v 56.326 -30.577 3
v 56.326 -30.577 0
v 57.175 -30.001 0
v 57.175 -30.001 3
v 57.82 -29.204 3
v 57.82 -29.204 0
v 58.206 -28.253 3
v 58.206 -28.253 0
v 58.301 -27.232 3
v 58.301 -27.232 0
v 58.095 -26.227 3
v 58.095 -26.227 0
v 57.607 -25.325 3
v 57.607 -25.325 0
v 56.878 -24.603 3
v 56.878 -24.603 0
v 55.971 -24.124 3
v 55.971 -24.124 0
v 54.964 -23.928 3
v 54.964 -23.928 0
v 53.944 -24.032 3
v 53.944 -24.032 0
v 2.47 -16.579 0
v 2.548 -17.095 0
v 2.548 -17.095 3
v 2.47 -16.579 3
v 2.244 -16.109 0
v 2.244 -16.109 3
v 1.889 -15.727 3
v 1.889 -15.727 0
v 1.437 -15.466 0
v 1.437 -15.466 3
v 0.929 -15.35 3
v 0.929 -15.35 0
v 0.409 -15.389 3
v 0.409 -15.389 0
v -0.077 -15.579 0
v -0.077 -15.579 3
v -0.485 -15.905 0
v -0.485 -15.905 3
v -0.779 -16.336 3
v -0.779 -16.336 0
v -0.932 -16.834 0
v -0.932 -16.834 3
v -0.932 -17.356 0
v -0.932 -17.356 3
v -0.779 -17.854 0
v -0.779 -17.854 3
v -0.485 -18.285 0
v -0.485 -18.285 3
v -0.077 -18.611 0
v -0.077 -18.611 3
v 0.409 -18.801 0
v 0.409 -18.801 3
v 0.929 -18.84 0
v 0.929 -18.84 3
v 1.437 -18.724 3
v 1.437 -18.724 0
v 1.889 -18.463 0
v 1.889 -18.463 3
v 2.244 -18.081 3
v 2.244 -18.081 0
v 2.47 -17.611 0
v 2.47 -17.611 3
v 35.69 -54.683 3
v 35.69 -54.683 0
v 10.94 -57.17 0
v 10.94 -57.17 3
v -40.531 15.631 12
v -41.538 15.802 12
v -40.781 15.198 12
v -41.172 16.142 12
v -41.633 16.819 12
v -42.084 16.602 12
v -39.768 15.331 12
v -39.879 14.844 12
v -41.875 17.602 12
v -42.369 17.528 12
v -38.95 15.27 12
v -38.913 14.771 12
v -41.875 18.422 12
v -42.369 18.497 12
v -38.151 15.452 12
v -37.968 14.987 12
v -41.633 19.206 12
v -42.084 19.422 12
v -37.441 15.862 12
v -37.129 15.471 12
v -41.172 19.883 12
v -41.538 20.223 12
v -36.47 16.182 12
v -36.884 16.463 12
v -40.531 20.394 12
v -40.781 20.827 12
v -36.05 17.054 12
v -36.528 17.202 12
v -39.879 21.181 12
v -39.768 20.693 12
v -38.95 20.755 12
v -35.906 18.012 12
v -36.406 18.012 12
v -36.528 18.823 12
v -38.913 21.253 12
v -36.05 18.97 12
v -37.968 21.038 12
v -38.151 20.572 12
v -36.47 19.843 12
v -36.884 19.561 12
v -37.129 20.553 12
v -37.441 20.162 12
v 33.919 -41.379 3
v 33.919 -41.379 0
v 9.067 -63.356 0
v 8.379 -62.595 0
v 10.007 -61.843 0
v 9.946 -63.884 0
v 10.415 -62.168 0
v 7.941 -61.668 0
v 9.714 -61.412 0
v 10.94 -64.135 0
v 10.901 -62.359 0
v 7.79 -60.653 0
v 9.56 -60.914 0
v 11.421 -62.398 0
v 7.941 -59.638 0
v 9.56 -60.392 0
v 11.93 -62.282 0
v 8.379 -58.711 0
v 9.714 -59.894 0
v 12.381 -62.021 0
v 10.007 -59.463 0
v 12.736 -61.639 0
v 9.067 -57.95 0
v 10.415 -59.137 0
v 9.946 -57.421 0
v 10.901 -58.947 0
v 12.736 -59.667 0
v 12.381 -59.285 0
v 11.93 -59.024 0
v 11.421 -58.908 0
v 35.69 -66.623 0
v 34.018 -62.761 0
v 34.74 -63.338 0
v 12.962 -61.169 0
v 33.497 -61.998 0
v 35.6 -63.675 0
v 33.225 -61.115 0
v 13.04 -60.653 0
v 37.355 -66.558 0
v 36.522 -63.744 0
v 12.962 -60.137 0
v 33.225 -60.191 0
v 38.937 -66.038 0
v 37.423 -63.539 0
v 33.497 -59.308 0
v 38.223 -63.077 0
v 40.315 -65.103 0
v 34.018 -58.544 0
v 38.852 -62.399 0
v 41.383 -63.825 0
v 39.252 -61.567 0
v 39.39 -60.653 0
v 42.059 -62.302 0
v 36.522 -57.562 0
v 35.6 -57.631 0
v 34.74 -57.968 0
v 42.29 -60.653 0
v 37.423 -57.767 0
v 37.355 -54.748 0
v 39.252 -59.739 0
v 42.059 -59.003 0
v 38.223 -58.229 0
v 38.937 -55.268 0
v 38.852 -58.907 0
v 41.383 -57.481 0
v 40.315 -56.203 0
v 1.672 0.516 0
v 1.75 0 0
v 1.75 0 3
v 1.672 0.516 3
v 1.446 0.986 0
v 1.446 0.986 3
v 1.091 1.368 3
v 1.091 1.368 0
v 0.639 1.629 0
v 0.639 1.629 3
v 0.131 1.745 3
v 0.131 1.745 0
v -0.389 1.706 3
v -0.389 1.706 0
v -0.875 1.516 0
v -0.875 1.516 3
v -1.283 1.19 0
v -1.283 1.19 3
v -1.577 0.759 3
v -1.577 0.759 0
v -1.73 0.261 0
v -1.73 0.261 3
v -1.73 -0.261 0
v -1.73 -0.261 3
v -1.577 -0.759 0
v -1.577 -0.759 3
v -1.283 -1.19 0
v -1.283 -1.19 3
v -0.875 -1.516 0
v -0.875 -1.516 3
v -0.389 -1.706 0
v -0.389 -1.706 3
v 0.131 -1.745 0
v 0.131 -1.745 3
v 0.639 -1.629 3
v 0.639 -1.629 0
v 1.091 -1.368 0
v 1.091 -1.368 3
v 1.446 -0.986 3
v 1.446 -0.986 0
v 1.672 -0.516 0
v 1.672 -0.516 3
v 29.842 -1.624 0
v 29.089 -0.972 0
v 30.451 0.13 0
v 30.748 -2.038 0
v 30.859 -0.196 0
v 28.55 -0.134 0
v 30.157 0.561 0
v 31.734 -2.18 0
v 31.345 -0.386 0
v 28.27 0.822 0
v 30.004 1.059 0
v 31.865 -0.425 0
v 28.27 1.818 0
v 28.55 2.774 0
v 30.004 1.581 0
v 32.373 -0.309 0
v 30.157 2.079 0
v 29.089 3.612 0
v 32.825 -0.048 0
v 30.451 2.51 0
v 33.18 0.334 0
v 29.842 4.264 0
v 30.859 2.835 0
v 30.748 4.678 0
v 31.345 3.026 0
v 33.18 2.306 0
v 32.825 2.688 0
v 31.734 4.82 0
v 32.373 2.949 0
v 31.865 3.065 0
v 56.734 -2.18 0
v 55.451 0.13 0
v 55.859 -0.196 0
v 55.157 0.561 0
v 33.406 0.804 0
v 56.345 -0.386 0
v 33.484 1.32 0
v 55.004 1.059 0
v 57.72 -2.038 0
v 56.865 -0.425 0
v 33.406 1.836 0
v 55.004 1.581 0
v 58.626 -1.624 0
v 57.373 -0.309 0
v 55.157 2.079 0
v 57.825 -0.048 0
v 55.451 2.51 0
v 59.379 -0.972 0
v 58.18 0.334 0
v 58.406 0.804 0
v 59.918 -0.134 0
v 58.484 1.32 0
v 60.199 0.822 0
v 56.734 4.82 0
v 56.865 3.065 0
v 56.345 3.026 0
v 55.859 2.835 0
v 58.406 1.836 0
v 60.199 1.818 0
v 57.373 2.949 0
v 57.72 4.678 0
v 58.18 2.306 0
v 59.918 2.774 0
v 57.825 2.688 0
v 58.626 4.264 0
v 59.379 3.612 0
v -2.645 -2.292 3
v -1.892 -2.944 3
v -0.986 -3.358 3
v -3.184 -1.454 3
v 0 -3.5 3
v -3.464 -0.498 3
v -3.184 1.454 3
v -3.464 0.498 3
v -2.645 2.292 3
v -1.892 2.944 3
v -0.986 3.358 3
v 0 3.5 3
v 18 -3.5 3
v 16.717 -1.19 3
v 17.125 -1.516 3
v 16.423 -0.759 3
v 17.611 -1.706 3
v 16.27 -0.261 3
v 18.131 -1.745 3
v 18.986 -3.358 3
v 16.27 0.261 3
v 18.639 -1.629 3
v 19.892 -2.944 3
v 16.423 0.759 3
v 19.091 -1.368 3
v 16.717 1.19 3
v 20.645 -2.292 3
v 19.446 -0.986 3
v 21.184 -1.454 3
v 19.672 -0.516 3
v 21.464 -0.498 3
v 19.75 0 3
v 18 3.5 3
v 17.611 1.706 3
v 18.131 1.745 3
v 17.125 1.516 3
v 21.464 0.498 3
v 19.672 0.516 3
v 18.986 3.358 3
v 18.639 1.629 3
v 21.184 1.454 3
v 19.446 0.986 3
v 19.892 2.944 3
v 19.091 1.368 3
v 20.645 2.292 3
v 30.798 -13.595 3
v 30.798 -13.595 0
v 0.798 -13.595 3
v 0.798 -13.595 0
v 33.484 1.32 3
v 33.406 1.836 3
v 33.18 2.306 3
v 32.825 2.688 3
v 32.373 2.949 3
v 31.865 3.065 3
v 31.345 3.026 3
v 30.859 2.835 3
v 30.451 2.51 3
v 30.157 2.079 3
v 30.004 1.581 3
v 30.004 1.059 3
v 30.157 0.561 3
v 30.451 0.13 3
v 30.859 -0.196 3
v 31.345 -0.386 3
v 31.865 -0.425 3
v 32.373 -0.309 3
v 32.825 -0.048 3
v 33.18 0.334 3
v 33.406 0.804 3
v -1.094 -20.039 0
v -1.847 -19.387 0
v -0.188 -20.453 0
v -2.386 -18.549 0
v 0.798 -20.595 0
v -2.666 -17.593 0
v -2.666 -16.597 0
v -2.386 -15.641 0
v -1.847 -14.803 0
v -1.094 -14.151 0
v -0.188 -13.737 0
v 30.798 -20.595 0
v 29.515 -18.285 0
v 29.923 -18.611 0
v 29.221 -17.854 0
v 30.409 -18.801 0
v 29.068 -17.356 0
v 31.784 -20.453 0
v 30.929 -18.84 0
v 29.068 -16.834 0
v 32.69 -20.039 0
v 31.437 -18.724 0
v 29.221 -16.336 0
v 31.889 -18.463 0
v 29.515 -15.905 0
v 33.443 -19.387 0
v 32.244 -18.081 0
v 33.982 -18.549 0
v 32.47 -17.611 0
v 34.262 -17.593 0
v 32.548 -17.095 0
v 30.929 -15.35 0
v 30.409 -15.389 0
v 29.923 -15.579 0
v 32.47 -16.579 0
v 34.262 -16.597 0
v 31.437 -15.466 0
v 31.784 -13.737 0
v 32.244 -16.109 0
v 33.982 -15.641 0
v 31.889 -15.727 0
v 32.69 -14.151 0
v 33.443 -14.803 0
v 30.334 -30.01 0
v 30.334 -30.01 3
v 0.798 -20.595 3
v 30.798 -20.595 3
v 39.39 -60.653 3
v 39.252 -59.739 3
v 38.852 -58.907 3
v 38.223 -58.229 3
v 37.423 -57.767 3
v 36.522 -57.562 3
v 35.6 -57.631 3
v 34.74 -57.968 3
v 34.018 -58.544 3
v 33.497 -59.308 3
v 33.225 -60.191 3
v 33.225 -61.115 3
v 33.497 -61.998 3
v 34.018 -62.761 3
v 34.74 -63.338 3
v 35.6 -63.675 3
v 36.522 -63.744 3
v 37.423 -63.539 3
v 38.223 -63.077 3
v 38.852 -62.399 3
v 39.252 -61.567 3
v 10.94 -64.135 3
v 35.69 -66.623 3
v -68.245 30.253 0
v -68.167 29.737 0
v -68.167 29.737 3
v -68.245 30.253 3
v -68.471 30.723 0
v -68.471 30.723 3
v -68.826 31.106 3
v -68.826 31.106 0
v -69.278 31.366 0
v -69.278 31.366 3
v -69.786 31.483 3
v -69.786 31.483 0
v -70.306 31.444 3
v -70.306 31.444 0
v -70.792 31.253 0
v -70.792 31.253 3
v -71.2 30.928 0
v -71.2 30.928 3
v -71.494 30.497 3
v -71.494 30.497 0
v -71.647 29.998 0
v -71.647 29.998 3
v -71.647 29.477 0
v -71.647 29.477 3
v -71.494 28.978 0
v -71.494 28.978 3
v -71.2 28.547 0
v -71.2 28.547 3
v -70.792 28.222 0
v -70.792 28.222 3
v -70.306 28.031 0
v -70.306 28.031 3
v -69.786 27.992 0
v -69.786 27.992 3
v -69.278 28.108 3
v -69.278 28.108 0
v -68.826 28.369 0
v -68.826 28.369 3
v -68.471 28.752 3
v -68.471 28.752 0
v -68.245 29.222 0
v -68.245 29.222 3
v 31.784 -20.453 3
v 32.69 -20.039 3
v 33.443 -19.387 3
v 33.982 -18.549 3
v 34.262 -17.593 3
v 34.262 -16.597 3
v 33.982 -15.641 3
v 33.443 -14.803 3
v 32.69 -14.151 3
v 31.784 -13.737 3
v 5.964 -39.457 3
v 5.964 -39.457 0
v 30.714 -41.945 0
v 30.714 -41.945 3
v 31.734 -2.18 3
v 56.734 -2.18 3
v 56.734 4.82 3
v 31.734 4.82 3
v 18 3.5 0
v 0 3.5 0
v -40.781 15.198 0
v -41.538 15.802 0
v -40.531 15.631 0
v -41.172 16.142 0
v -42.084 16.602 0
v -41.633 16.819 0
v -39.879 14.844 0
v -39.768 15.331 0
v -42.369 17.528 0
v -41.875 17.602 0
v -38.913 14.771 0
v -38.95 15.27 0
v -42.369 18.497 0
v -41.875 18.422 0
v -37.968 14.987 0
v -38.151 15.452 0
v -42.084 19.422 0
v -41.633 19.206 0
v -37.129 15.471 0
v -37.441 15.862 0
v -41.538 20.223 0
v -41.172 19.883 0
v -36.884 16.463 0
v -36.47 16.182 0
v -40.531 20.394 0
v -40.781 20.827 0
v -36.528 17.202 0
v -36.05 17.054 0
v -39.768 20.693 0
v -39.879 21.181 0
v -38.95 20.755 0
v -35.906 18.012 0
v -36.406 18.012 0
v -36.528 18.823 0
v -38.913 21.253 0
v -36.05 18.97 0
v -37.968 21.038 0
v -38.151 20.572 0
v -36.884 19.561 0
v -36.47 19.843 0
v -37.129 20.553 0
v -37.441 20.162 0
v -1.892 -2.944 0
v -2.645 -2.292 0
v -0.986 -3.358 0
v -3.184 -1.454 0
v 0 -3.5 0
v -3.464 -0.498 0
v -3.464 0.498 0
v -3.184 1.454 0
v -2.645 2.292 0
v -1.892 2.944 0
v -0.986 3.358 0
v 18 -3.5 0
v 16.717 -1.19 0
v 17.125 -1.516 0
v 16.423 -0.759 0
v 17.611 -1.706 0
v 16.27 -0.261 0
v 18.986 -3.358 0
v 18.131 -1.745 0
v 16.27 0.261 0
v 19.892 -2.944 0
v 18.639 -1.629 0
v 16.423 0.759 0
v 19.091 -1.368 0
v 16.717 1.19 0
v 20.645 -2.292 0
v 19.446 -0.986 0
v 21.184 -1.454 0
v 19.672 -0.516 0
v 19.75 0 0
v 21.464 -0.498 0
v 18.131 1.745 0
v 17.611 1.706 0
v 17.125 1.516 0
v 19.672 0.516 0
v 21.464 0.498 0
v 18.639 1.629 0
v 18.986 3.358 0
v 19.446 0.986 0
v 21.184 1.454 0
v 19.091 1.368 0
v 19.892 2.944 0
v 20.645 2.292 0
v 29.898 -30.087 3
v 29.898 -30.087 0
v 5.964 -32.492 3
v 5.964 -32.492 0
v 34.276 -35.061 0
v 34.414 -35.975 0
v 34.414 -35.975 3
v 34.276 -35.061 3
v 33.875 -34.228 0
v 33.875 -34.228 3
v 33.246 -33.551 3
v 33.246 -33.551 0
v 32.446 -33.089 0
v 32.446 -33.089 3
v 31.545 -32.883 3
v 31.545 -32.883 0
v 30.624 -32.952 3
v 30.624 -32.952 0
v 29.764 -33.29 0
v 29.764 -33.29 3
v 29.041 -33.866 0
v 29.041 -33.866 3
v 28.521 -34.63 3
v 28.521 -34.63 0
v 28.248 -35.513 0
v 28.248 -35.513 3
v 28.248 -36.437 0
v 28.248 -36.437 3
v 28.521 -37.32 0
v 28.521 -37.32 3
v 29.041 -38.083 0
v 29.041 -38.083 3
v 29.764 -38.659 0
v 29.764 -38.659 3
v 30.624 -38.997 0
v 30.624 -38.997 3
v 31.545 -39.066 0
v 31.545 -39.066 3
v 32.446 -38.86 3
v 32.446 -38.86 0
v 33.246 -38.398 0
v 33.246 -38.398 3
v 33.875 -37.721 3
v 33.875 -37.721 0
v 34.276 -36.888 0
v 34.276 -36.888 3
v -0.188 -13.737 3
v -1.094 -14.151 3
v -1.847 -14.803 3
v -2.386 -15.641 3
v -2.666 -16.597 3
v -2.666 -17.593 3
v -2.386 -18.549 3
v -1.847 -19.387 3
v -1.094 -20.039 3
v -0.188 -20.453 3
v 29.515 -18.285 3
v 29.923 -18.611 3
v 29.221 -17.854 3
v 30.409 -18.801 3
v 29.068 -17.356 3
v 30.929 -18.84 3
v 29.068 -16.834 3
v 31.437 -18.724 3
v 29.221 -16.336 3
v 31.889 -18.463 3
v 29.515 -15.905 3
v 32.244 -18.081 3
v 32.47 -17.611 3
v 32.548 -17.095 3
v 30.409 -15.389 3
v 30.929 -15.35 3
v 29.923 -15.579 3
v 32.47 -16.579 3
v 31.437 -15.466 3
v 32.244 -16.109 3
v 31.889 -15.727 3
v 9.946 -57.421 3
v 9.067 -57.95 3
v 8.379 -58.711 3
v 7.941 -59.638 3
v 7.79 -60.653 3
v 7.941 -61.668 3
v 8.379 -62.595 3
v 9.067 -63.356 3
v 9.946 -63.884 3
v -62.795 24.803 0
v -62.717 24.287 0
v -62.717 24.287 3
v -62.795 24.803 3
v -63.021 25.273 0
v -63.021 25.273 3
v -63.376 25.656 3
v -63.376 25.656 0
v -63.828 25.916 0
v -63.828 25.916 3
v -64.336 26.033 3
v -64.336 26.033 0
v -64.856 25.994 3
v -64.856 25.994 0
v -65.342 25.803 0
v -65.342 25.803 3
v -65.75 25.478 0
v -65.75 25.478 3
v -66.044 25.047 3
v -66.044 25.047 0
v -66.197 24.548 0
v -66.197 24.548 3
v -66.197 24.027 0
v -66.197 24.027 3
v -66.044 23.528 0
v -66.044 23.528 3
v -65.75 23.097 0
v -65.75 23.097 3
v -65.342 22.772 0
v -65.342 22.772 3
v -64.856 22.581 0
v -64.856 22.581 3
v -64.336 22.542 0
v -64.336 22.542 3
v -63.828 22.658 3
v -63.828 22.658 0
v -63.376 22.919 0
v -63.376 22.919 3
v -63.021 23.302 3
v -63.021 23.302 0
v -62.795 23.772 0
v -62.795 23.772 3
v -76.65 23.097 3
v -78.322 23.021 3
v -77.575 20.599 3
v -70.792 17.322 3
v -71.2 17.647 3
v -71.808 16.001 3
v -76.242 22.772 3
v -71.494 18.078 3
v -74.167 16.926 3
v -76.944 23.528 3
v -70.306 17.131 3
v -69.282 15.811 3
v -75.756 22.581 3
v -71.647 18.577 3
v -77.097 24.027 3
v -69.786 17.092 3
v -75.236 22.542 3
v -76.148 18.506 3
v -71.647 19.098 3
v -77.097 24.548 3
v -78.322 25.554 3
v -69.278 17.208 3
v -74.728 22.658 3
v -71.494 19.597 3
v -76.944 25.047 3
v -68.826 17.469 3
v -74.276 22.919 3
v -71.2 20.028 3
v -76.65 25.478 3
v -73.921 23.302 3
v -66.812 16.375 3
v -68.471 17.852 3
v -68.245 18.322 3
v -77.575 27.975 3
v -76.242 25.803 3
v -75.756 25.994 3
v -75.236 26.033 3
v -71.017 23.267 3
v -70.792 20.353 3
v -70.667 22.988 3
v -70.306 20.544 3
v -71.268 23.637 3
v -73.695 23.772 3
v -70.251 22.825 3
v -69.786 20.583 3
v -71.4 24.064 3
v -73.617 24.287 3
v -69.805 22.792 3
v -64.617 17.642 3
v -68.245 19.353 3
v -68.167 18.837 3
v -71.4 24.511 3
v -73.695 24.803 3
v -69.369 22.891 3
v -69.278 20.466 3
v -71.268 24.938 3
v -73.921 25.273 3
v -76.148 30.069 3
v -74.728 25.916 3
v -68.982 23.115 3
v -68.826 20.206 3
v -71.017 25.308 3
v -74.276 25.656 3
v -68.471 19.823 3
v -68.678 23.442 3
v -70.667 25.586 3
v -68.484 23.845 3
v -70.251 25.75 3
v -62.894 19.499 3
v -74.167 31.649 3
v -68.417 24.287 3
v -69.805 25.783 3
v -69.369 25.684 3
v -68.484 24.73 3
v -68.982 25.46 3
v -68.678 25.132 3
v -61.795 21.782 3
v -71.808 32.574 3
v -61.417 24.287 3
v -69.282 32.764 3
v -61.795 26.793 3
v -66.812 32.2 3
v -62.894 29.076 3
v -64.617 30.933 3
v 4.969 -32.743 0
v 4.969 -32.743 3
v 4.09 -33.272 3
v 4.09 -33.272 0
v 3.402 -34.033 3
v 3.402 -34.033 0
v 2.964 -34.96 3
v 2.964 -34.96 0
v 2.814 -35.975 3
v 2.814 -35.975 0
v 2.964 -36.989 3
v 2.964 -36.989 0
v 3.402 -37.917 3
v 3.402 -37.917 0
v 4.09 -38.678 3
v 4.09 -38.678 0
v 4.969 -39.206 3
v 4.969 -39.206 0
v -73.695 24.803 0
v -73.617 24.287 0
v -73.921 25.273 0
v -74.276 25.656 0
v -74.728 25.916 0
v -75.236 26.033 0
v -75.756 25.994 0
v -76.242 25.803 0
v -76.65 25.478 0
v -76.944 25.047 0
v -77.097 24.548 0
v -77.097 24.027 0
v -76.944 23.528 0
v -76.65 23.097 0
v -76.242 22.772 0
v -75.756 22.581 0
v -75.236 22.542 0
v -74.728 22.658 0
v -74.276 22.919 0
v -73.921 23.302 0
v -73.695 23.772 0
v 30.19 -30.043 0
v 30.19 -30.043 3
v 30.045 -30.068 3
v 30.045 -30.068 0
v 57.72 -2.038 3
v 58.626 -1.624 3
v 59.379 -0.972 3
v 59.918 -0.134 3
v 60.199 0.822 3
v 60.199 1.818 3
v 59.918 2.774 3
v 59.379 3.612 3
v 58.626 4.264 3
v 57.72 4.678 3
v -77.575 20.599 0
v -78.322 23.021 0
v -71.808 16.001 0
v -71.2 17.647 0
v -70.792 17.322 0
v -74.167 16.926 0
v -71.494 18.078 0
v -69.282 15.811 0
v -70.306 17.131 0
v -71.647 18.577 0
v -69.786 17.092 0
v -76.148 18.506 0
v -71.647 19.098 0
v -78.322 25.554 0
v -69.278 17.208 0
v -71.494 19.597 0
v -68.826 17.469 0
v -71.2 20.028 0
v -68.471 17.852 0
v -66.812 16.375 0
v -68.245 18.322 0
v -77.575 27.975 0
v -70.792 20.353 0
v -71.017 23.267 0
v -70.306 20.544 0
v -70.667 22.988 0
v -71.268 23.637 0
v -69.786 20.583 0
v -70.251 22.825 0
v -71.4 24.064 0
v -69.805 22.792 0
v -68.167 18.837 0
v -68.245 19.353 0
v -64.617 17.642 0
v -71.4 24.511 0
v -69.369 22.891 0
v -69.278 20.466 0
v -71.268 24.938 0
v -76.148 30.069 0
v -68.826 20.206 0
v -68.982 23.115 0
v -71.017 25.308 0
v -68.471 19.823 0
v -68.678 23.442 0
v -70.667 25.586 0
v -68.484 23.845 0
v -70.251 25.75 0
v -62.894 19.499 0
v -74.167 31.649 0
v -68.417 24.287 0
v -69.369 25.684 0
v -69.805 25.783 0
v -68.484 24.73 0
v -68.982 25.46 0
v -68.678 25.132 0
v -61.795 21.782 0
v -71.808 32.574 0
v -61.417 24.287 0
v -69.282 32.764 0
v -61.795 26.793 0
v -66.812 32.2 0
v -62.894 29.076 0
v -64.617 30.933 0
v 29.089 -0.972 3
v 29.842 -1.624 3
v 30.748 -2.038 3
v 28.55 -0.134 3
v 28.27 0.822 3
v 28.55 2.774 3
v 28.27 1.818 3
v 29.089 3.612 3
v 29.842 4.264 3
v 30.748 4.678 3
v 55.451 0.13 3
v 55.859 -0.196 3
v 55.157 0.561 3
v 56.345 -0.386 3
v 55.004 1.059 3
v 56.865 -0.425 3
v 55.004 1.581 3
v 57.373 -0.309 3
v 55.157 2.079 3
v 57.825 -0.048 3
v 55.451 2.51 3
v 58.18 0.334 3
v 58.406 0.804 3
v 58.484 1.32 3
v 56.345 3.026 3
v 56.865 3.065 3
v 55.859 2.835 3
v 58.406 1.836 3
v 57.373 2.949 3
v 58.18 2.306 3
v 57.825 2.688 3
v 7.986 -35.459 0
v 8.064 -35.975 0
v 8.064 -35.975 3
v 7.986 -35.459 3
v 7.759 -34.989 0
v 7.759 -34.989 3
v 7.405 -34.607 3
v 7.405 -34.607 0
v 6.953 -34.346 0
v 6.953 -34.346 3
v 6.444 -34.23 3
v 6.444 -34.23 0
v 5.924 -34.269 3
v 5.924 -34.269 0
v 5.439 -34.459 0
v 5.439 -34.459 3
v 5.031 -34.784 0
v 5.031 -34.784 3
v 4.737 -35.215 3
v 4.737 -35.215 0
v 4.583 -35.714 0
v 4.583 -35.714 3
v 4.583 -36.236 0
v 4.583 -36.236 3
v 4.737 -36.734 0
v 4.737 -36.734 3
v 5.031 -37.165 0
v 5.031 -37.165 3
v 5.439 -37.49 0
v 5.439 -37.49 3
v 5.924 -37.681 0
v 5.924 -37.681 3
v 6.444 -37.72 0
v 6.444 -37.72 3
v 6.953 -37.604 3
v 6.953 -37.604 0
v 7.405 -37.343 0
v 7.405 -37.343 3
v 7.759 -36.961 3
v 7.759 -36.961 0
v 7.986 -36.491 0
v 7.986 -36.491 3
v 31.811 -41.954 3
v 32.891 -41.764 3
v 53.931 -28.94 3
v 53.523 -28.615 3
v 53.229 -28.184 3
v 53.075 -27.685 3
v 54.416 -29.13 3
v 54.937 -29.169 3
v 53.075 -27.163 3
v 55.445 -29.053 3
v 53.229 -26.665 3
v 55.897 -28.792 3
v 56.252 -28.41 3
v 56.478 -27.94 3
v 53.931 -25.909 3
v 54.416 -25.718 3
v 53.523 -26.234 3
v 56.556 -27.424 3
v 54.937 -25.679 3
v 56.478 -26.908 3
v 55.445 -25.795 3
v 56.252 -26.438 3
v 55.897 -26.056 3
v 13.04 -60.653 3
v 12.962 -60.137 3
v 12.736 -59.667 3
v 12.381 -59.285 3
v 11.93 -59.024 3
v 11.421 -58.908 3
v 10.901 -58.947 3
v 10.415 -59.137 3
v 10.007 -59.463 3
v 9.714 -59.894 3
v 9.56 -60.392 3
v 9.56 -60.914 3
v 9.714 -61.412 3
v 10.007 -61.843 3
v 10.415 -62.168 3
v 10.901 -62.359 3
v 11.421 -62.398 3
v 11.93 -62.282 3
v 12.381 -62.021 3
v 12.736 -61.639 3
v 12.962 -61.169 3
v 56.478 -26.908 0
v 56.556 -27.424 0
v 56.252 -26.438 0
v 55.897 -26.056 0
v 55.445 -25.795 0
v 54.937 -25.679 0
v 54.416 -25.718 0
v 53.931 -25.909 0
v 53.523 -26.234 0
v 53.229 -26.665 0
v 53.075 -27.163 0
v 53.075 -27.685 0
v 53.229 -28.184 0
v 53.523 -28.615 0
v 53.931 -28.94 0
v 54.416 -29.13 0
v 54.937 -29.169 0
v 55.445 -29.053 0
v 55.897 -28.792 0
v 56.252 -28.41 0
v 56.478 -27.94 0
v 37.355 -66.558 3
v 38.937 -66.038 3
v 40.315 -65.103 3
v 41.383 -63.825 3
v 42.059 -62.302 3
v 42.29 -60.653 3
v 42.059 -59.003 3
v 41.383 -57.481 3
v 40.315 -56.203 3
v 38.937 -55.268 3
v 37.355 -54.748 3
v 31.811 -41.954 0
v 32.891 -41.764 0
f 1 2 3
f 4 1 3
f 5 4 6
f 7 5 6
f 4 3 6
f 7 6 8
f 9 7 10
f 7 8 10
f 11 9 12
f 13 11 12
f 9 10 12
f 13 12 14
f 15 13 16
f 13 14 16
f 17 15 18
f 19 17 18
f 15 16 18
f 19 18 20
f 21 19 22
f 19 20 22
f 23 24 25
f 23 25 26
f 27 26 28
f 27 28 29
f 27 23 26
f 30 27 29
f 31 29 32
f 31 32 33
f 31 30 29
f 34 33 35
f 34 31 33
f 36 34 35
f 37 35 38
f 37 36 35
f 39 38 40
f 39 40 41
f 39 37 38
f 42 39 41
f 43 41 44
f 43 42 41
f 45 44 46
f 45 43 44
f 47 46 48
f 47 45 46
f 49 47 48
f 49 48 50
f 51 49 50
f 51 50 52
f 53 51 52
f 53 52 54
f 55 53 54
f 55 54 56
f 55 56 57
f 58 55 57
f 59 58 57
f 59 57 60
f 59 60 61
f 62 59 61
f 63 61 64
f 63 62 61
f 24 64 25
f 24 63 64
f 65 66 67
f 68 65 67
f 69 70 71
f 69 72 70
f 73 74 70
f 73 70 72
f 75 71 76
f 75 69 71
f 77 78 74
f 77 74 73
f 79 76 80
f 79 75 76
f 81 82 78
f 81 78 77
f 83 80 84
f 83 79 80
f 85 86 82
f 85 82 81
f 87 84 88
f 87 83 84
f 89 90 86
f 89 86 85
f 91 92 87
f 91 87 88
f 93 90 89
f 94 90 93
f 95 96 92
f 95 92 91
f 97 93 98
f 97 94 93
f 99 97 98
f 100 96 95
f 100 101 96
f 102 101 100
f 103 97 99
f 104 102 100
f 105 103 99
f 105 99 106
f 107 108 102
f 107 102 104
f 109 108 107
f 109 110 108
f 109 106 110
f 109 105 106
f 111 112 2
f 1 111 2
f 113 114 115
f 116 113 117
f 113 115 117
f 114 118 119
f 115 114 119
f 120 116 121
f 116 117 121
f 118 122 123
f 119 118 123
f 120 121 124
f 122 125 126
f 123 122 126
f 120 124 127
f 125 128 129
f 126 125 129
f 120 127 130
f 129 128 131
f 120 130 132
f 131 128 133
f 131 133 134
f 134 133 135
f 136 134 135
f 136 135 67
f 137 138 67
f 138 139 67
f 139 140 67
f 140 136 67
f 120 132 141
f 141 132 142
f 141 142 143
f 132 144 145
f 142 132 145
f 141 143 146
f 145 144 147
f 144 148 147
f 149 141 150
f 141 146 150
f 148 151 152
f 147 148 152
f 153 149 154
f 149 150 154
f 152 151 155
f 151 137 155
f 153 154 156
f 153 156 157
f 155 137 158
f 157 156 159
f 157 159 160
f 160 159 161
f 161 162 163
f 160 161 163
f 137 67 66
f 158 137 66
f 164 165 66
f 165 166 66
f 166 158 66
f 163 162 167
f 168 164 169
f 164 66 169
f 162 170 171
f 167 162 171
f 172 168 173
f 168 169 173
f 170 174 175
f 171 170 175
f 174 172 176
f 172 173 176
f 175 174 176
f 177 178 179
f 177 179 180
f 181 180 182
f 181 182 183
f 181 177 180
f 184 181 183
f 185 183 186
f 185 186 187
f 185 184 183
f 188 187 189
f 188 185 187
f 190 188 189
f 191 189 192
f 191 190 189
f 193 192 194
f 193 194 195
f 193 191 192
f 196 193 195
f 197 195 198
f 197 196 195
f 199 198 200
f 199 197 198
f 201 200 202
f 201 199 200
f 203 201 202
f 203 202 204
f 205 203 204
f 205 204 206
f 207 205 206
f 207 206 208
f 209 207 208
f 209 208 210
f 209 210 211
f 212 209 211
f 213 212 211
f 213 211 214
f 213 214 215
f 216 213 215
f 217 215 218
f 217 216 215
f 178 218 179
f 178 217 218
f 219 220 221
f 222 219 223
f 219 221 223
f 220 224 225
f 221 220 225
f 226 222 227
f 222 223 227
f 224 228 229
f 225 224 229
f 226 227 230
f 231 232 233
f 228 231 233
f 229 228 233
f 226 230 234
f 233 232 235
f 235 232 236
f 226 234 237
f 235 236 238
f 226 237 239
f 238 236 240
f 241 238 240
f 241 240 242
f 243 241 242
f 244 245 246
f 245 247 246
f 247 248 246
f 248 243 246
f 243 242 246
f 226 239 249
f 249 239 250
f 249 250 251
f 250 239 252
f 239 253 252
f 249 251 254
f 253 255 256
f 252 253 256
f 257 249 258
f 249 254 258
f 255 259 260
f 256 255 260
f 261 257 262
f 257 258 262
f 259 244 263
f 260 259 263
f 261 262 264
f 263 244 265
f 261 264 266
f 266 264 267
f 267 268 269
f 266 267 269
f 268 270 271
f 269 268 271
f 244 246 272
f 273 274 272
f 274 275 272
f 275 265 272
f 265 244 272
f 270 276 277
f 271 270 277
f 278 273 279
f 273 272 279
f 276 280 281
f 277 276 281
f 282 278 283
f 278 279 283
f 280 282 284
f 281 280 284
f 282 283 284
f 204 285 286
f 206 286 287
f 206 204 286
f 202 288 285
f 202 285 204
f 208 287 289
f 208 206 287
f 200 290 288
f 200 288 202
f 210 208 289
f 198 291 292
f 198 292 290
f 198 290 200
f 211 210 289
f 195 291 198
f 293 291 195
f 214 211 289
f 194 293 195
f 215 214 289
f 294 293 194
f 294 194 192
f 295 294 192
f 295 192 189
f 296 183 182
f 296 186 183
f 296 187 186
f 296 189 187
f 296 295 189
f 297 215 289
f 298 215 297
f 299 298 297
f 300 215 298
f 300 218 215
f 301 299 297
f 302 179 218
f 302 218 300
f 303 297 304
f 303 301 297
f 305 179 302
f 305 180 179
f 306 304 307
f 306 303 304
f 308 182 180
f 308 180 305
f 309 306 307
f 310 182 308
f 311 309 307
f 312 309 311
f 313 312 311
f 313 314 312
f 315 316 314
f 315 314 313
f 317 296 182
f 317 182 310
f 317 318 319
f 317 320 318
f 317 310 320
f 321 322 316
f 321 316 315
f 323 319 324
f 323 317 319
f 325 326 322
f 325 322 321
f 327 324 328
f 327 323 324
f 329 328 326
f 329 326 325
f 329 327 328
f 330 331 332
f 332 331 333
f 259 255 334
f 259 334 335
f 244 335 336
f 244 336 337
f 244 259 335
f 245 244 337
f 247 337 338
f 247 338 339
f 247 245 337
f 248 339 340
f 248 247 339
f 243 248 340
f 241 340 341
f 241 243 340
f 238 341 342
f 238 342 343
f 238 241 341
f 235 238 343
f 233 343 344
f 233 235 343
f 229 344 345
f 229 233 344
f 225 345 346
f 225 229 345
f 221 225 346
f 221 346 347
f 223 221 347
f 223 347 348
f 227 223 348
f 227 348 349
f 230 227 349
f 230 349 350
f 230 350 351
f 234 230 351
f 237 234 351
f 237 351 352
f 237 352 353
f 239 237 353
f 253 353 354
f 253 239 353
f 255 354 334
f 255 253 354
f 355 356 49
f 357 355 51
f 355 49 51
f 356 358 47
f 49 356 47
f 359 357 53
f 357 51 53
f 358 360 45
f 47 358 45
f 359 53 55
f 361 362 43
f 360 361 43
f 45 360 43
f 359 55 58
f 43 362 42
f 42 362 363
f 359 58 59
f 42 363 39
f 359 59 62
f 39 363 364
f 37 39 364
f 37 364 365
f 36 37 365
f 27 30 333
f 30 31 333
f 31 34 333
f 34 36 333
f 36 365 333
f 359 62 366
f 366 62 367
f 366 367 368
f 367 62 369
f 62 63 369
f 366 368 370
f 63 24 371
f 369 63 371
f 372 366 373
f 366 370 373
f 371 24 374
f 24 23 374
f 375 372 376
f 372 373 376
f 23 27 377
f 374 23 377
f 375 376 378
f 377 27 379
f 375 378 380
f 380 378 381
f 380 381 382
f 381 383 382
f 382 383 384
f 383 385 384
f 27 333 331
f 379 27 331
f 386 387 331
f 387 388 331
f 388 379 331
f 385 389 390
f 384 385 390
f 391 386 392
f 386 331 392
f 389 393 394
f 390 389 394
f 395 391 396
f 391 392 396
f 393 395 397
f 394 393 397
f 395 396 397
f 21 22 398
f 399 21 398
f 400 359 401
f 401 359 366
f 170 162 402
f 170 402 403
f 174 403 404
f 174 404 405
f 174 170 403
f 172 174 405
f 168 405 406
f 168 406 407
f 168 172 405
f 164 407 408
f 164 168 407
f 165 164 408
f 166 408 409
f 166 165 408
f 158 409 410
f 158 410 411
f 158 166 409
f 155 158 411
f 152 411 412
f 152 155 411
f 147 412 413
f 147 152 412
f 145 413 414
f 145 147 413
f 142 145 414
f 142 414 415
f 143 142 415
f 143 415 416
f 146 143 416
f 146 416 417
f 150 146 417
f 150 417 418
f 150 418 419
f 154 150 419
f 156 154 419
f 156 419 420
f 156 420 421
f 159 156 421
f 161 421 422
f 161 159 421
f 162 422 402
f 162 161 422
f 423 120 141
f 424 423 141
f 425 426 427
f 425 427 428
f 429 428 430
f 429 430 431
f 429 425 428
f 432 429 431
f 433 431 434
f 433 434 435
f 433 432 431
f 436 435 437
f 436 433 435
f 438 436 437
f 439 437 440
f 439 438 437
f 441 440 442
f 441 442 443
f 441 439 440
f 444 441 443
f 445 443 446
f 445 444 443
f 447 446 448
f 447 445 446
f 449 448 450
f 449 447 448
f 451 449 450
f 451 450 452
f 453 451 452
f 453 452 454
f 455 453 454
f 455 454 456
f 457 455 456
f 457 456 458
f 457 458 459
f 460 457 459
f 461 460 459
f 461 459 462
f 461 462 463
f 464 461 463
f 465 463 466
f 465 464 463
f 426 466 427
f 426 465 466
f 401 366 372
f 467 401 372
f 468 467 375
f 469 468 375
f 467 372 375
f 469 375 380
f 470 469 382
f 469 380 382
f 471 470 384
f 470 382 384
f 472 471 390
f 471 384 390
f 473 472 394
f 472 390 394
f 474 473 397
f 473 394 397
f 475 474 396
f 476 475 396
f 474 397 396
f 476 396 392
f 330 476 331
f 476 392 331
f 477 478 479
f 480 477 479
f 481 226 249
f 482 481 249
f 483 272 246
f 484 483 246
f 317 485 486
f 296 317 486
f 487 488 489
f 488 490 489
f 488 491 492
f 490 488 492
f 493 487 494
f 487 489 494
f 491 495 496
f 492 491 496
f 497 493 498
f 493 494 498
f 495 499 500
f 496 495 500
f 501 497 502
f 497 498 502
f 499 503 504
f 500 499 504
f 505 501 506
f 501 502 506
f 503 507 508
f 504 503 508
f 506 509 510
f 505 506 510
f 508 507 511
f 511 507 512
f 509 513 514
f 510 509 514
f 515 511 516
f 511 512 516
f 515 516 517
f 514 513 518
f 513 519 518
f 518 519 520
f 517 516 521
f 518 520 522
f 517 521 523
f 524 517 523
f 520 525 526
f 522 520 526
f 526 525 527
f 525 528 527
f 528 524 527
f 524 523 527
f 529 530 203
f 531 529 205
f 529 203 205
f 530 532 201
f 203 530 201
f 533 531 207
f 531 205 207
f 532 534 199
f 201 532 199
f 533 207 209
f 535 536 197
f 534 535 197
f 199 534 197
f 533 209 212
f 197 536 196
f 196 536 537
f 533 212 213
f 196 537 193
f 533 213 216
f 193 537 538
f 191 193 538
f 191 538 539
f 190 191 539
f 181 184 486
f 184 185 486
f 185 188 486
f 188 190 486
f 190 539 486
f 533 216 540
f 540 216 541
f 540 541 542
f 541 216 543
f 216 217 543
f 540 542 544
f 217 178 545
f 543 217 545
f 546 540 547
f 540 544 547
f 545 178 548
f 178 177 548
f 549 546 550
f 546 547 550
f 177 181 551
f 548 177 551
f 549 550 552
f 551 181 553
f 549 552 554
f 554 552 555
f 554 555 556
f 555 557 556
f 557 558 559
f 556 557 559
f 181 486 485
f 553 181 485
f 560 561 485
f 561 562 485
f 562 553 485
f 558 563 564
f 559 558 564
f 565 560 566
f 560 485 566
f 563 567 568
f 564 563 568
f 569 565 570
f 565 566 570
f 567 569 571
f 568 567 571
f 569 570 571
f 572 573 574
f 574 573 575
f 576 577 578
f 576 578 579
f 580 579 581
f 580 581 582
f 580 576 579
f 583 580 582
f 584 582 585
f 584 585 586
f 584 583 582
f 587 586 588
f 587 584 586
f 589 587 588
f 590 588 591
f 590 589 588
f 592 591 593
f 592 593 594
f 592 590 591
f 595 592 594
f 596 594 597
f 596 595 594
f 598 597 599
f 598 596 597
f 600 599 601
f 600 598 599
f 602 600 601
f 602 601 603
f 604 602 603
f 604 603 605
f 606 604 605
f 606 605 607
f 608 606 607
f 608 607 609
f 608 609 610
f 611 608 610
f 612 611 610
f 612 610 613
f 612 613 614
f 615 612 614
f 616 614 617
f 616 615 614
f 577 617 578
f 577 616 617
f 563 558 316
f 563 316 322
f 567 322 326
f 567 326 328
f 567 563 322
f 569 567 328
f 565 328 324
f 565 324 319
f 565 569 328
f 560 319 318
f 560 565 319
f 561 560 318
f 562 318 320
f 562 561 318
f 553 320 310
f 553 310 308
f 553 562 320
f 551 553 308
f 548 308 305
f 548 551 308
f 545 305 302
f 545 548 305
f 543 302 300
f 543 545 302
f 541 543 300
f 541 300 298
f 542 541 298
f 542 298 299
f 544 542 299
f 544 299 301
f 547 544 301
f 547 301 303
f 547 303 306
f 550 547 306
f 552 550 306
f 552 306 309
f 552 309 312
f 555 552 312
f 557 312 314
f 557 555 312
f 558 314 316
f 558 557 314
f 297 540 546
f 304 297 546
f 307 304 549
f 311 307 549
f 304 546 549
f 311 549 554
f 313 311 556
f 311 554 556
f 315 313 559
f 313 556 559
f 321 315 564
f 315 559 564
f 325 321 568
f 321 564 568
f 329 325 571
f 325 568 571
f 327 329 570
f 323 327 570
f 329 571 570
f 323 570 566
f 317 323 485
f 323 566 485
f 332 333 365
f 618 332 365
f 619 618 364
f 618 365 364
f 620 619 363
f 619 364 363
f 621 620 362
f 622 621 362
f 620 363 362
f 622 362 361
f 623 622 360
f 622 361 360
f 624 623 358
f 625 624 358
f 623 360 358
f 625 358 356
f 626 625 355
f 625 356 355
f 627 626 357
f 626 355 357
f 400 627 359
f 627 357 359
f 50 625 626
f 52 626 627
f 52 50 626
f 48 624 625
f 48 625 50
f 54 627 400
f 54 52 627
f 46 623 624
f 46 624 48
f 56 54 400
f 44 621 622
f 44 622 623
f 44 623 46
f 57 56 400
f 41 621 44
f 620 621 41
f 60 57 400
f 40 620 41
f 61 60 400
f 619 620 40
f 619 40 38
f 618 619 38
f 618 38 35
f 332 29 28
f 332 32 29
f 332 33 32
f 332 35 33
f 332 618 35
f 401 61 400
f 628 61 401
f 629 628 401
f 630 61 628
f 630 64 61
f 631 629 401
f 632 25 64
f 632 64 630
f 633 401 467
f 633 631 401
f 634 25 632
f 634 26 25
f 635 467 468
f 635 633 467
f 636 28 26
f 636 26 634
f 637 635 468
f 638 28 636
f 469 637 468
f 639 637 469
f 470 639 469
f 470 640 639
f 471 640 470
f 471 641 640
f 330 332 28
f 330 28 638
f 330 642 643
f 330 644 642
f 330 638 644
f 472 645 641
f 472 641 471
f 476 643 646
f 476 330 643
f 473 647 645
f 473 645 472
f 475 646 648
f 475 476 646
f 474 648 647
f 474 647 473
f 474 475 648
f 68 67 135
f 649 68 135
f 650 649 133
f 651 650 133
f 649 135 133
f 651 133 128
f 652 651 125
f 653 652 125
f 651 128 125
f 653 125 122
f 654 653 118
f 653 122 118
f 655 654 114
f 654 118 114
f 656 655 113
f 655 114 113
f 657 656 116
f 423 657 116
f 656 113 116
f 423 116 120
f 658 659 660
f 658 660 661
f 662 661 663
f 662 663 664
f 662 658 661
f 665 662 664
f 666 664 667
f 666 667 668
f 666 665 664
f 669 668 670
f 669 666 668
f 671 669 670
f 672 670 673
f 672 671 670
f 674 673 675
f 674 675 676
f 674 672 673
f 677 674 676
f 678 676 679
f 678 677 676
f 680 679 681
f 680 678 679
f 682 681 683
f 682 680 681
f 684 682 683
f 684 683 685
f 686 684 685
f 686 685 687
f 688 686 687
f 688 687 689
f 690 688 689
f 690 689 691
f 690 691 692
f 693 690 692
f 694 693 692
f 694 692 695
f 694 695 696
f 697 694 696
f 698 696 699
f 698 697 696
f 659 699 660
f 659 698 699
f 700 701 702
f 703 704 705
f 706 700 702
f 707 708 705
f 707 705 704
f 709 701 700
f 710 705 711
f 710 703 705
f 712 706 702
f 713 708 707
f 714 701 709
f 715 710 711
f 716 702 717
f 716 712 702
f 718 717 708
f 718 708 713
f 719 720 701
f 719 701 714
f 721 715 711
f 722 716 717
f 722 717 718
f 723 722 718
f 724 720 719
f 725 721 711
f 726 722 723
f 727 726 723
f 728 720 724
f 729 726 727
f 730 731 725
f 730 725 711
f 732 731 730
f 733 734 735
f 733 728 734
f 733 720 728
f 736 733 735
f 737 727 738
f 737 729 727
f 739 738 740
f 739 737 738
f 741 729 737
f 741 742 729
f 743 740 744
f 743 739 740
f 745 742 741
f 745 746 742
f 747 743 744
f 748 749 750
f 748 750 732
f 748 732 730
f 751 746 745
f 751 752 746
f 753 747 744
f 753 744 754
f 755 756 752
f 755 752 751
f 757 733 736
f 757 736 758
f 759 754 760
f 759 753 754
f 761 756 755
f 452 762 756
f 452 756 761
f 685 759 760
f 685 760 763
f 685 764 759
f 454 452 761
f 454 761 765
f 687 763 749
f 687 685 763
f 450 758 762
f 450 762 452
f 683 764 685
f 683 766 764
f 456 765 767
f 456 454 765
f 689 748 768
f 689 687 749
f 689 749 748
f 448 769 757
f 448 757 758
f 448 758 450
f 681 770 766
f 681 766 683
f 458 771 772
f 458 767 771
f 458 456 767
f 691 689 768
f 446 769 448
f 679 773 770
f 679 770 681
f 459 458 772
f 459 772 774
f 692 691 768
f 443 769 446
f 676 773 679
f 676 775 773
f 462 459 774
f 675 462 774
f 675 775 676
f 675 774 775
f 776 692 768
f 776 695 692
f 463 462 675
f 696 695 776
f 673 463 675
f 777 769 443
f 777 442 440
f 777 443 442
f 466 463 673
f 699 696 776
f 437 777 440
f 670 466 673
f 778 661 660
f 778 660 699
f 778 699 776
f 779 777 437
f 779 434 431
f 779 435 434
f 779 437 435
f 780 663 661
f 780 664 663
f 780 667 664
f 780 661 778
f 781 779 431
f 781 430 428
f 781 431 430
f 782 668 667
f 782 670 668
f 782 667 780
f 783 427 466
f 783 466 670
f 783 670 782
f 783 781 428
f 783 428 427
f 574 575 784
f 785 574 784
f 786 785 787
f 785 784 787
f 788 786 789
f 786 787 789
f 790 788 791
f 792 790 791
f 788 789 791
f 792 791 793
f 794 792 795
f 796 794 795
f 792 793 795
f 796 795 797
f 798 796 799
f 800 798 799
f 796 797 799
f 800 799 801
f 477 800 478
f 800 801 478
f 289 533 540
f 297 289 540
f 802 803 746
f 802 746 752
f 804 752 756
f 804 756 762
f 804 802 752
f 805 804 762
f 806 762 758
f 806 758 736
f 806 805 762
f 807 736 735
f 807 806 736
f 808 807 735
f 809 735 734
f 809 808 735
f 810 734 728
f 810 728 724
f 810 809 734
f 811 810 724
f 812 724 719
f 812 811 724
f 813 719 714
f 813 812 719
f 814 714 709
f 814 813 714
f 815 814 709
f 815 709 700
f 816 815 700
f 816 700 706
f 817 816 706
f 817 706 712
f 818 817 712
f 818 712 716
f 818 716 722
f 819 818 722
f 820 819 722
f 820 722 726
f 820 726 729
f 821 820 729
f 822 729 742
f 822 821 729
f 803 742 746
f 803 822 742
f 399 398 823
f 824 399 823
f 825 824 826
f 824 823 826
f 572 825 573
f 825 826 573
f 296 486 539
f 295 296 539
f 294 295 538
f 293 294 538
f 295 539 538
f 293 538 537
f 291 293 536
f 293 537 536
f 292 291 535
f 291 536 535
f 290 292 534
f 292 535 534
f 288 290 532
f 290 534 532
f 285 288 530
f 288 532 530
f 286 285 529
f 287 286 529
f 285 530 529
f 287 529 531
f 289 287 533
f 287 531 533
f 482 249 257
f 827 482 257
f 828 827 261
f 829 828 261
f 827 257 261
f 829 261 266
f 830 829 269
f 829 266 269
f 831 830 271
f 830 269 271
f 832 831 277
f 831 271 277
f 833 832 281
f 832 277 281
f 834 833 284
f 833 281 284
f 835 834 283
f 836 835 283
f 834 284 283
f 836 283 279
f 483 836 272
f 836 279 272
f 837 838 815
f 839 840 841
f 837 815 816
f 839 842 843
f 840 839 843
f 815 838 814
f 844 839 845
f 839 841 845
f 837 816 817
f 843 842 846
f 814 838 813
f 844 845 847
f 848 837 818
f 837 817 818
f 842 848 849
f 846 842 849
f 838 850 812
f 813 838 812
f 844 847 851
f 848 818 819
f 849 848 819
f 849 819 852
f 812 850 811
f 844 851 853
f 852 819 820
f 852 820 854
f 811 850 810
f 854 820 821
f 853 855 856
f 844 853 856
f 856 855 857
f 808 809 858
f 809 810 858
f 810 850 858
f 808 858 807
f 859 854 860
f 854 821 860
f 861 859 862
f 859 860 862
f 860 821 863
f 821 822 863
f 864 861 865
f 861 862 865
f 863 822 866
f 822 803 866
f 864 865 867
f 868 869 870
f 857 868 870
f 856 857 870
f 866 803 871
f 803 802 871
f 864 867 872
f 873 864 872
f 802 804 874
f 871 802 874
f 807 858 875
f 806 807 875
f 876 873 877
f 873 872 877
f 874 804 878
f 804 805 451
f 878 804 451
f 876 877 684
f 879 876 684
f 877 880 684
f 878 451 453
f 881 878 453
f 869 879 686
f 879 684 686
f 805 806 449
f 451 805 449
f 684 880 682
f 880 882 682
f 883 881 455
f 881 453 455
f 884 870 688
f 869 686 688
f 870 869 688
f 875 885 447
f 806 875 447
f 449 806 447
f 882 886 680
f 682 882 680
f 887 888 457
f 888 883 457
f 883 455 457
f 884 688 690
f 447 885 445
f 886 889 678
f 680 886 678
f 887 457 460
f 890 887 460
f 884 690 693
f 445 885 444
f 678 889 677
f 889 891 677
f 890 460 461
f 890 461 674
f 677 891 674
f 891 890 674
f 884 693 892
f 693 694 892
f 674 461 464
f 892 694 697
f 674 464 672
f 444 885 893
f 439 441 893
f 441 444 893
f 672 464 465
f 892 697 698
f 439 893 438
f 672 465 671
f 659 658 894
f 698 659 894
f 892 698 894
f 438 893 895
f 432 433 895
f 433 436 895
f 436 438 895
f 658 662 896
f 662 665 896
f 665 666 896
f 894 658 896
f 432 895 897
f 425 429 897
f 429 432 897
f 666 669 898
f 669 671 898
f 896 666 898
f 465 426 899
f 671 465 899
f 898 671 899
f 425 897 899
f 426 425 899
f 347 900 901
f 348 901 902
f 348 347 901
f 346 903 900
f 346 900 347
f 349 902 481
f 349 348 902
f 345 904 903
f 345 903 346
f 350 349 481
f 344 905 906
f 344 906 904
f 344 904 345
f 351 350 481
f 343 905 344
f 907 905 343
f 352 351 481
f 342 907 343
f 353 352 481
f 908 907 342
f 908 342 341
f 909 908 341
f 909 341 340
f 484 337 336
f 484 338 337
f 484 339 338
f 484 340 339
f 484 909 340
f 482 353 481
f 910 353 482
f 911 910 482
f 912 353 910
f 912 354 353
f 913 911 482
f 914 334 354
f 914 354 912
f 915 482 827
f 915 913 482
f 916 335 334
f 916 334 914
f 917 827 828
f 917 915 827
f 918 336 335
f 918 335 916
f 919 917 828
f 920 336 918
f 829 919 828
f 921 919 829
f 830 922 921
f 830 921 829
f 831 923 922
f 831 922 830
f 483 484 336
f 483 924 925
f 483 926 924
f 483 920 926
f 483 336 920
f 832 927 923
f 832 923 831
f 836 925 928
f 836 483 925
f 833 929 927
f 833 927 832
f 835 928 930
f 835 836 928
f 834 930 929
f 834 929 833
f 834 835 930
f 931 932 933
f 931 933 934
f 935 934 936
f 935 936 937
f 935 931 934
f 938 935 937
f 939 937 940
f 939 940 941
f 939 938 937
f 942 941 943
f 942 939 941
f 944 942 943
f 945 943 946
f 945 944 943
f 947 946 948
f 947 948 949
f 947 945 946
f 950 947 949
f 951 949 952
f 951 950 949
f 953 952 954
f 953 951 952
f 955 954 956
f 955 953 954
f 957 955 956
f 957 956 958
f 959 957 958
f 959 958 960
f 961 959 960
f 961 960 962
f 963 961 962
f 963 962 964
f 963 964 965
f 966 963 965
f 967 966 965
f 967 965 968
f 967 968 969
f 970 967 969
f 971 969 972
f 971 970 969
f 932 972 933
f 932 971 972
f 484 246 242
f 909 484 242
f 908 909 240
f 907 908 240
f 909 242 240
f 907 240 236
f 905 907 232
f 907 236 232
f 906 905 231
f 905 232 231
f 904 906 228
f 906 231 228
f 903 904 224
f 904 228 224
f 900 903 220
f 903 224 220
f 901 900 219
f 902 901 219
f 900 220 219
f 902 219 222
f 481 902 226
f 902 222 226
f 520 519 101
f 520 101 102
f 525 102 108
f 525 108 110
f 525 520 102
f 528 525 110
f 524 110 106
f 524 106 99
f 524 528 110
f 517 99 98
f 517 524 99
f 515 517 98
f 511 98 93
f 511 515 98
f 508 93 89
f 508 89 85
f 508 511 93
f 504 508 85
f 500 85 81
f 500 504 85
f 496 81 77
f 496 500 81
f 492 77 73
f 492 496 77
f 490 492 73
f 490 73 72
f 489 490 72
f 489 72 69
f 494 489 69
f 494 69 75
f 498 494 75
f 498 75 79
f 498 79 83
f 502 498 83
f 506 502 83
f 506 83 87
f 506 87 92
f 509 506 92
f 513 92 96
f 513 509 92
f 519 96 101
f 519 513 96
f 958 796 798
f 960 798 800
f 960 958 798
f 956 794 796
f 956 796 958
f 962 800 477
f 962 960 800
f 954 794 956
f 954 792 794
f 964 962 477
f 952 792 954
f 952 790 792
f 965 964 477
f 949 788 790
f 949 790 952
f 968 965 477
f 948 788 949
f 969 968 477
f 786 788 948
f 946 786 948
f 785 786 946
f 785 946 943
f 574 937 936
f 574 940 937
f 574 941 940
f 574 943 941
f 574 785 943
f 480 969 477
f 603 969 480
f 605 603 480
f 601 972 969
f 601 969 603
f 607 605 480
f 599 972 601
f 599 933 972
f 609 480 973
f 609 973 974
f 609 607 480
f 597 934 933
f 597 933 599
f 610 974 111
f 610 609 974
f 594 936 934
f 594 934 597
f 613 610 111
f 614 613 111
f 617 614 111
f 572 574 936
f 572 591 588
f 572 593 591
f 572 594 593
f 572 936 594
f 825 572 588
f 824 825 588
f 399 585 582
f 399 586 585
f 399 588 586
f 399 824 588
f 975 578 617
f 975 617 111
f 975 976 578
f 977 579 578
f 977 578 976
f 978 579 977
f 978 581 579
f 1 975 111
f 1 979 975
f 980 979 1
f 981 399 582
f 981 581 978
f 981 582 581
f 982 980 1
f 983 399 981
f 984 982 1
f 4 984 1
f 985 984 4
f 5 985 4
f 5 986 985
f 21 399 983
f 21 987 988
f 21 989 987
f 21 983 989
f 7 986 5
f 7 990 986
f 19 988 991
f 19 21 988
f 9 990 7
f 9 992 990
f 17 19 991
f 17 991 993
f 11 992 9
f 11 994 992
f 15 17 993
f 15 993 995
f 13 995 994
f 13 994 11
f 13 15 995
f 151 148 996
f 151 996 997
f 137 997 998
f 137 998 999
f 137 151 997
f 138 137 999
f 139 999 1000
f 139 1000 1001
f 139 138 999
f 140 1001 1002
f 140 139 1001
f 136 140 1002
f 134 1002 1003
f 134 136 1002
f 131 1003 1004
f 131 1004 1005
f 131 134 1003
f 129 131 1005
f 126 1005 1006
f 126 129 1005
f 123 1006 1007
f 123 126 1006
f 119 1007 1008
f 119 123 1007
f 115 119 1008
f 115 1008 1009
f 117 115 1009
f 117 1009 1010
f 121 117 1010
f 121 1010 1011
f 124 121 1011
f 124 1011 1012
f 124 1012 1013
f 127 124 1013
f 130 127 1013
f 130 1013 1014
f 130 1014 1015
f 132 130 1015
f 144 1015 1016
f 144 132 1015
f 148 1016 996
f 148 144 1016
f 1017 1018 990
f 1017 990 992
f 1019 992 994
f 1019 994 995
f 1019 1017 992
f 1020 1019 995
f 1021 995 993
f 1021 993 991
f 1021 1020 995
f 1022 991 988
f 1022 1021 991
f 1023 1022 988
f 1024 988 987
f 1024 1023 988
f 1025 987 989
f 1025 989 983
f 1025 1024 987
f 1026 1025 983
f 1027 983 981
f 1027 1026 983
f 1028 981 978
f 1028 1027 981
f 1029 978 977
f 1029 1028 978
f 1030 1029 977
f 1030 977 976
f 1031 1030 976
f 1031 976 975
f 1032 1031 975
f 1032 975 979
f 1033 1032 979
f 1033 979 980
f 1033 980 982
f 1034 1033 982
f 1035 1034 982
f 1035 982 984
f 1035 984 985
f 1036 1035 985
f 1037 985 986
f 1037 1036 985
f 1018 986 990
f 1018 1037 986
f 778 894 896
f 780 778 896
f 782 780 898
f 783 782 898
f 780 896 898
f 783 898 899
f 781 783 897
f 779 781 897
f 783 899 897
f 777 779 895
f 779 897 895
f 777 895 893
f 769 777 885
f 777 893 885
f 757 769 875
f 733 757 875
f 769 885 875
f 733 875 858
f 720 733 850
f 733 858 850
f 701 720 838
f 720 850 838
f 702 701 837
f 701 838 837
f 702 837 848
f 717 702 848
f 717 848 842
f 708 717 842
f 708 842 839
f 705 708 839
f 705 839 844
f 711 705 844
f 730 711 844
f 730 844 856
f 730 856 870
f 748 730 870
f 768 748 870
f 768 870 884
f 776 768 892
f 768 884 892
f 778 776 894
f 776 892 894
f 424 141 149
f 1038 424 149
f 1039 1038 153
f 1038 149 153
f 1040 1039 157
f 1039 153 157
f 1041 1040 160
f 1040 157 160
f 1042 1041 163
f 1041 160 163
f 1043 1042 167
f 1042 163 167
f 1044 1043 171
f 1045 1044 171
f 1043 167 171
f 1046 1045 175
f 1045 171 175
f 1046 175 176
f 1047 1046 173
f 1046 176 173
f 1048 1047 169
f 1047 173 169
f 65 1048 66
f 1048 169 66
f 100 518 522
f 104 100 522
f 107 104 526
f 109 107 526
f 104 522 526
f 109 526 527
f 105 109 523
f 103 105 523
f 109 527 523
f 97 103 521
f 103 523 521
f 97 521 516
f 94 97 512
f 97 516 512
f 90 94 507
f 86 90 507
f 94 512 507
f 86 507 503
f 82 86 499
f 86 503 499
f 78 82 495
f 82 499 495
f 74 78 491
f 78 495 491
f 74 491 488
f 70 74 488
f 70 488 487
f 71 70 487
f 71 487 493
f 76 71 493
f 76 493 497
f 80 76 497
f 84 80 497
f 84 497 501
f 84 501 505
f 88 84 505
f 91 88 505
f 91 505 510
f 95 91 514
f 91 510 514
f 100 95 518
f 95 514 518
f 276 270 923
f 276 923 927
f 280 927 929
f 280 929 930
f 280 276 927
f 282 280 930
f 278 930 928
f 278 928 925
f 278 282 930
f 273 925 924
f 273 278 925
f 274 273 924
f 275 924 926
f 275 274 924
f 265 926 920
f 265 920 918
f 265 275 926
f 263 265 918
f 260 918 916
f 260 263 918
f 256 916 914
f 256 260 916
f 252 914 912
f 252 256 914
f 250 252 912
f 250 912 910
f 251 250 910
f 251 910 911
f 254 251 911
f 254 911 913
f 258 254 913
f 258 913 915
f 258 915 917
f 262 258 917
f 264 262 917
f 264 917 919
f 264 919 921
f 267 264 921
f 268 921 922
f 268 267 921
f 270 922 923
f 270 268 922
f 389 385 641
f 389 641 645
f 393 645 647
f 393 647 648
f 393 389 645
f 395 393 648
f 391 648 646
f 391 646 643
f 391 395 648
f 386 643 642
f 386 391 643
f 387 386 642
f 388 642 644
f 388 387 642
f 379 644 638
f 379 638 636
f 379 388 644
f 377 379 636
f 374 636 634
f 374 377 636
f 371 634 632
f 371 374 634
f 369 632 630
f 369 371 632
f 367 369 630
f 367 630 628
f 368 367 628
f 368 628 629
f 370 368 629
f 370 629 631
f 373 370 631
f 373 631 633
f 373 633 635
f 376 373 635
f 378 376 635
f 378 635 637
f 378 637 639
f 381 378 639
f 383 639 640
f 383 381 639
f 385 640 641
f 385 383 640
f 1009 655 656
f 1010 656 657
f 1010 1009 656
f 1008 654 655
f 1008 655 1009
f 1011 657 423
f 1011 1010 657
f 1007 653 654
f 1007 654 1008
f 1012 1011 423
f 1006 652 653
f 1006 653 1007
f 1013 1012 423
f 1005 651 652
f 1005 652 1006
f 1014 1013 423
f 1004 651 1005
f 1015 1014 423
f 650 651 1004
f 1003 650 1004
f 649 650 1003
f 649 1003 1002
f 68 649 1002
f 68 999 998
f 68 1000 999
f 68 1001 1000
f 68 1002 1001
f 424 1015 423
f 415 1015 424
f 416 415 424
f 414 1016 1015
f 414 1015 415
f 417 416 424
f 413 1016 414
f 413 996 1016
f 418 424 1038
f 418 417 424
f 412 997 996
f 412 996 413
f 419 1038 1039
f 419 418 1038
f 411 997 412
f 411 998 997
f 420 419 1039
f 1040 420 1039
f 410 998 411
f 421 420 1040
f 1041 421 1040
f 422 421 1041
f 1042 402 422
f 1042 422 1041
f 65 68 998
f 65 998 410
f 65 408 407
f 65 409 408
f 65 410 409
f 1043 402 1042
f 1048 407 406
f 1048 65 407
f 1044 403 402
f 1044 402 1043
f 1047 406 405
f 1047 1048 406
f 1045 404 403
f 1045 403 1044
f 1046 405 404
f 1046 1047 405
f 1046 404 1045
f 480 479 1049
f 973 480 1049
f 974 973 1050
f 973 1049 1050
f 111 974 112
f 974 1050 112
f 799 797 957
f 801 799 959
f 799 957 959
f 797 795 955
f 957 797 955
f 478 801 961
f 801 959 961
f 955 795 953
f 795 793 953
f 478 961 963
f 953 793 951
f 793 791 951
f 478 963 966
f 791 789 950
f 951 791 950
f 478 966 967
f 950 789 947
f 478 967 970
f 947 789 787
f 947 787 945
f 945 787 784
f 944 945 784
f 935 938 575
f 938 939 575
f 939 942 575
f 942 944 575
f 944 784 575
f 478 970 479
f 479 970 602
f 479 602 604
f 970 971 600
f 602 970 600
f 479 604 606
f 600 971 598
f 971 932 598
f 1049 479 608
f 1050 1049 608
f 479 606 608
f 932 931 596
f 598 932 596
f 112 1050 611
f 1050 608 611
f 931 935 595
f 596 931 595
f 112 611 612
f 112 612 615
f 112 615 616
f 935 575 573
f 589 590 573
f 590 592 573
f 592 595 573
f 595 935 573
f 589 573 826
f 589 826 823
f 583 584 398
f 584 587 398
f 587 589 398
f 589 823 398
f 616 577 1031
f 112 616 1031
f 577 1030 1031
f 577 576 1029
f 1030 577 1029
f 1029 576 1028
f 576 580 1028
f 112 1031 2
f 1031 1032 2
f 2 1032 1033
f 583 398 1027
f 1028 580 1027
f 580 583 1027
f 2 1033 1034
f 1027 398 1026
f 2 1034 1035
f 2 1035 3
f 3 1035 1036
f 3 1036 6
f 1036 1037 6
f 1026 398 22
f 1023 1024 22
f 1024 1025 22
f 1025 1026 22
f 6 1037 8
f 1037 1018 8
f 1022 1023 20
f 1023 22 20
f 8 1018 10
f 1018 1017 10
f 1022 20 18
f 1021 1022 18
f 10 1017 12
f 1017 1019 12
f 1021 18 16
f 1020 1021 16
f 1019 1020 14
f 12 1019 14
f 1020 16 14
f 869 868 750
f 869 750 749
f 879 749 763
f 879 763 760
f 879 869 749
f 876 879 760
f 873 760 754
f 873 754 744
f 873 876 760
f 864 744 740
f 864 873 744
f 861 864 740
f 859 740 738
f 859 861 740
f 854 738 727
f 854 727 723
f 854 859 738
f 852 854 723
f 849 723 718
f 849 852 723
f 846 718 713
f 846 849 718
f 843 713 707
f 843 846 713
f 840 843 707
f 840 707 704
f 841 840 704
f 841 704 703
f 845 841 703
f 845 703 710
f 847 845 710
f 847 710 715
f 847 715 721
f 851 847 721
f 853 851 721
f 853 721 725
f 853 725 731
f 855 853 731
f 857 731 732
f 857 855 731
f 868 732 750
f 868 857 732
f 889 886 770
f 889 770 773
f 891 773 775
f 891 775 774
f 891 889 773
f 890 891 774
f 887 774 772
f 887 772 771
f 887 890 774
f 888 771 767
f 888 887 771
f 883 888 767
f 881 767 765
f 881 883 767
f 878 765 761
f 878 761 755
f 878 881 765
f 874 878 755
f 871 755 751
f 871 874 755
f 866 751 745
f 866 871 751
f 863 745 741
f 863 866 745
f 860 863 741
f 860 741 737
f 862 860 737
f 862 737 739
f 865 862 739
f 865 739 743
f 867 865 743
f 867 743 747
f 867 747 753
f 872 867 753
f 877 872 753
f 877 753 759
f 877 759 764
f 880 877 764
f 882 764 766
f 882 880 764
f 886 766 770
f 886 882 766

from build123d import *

# Parameters (mm, degrees)
F0_R     = 1.75
F0_R_2   = 3.1
F1_DEPTH = 3
F2_R     = 8.5
F2_R_2   = 1.75
F2_R_3   = 1.5
F3_DEPTH = 3
F4_DEPTH = 3
F2_R_4   = 3.25
F2_R_5   = 2.75
F5_DEPTH = 12


with BuildPart() as f1:
    # F0 (on Top) → F1 (new body)
    with BuildSketch(Plane.XY):
        with BuildLine():
            Line((18, 3.5), (0, 3.5))
            ThreePointArc((0, 3.5), (-3.5, 0), (0, -3.5))
            Line((0, -3.5), (18, -3.5))
            ThreePointArc((18, -3.5), (21.5, 0), (18, 3.5))
        make_face()
        Circle(F0_R, mode=Mode.SUBTRACT)
        with Locations((18, 0)):
            Circle(F0_R, mode=Mode.SUBTRACT)
        with BuildLine():
            Line((30.798049, -13.595002), (0.798049, -13.595002))
            ThreePointArc((0.798049, -13.595002), (-2.701951, -17.095002), (0.798049, -20.595002))
            Line((0.798049, -20.595002), (30.798049, -20.595002))
            ThreePointArc((30.798049, -20.595002), (34.298049, -17.095002), (30.798049, -13.595002))
        make_face()
        with Locations((0.798049, -17.095002)):
            Circle(F0_R, mode=Mode.SUBTRACT)
        with Locations((30.798049, -17.095002)):
            Circle(F0_R, mode=Mode.SUBTRACT)
        with BuildLine():
            Line((29.898118, -30.086758), (5.963541, -32.492274))
            ThreePointArc((5.963541, -32.492274), (2.813541, -35.97473), (5.963541, -39.457186))
            Line((5.963541, -39.457186), (30.713541, -41.944654))
            ThreePointArc((30.713541, -41.944654), (32.355431, -41.883576), (33.919191, -41.379412))
            Line((33.919191, -41.379412), (56.325819, -30.576957))
            ThreePointArc((56.325819, -30.576957), (58.094781, -26.227156), (53.943679, -24.032081))
            Line((53.943679, -24.032081), (30.33449, -30.010018))
            ThreePointArc((30.33449, -30.010018), (30.117723, -30.056455), (29.898118, -30.086758))
        make_face()
        with Locations((6.313541, -35.97473)):
            Circle(F0_R, mode=Mode.SUBTRACT)
        with Locations((31.313541, -35.97473)):
            Circle(F0_R_2, mode=Mode.SUBTRACT)
        with Locations((54.805857, -27.424226)):
            Circle(F0_R, mode=Mode.SUBTRACT)
        with BuildLine():
            Line((35.690217, -54.682968), (10.940217, -57.170437))
            ThreePointArc((10.940217, -57.170437), (7.790217, -60.652893), (10.940217, -64.135349))
            Line((10.940217, -64.135349), (35.690217, -66.622818))
            ThreePointArc((35.690217, -66.622818), (42.290217, -60.652893), (35.690217, -54.682968))
        make_face()
        with Locations((11.290217, -60.652893)):
            Circle(F0_R, mode=Mode.SUBTRACT)
        with Locations((36.290217, -60.652893)):
            Circle(F0_R_2, mode=Mode.SUBTRACT)
    extrude(amount=F1_DEPTH)


with BuildPart() as f3:
    # F2 (on Top) → F3 (new body)
    with BuildSketch(Plane.XY):
        with Locations((-69.917015, 24.287433)):
            Circle(F2_R)
        with Locations((-69.917015, 18.837433)):
            Circle(F2_R_2, mode=Mode.SUBTRACT)
        with Locations((-75.367015, 24.287433)):
            Circle(F2_R_2, mode=Mode.SUBTRACT)
        with Locations((-69.917015, 24.287433)):
            Circle(F2_R_3, mode=Mode.SUBTRACT)
        with Locations((-64.467015, 24.287433)):
            Circle(F2_R_2, mode=Mode.SUBTRACT)
        with Locations((-69.917015, 29.737433)):
            Circle(F2_R_2, mode=Mode.SUBTRACT)
    extrude(amount=F3_DEPTH)


with BuildPart() as f4:
    # F0 (on Top) → F4 (new body)
    with BuildSketch(Plane.XY):
        with BuildLine():
            Line((56.734147, 4.819935), (31.734147, 4.819935))
            ThreePointArc((31.734147, 4.819935), (28.234147, 1.319935), (31.734147, -2.180065))
            Line((31.734147, -2.180065), (56.734147, -2.180065))
            ThreePointArc((56.734147, -2.180065), (60.234147, 1.319935), (56.734147, 4.819935))
        make_face()
        with Locations((31.734147, 1.319935)):
            Circle(F0_R, mode=Mode.SUBTRACT)
        with Locations((56.734147, 1.319935)):
            Circle(F0_R, mode=Mode.SUBTRACT)
    extrude(amount=F4_DEPTH)


with BuildPart() as f5:
    # F2 (on Top) → F5 (new body)
    with BuildSketch(Plane.XY):
        with Locations((-39.155681, 18.01236)):
            Circle(F2_R_4)
        with Locations((-39.155681, 18.01236)):
            Circle(F2_R_5, mode=Mode.SUBTRACT)
    extrude(amount=F5_DEPTH)


solid = Compound([f1.part, f3.part, f4.part, f5.part])
